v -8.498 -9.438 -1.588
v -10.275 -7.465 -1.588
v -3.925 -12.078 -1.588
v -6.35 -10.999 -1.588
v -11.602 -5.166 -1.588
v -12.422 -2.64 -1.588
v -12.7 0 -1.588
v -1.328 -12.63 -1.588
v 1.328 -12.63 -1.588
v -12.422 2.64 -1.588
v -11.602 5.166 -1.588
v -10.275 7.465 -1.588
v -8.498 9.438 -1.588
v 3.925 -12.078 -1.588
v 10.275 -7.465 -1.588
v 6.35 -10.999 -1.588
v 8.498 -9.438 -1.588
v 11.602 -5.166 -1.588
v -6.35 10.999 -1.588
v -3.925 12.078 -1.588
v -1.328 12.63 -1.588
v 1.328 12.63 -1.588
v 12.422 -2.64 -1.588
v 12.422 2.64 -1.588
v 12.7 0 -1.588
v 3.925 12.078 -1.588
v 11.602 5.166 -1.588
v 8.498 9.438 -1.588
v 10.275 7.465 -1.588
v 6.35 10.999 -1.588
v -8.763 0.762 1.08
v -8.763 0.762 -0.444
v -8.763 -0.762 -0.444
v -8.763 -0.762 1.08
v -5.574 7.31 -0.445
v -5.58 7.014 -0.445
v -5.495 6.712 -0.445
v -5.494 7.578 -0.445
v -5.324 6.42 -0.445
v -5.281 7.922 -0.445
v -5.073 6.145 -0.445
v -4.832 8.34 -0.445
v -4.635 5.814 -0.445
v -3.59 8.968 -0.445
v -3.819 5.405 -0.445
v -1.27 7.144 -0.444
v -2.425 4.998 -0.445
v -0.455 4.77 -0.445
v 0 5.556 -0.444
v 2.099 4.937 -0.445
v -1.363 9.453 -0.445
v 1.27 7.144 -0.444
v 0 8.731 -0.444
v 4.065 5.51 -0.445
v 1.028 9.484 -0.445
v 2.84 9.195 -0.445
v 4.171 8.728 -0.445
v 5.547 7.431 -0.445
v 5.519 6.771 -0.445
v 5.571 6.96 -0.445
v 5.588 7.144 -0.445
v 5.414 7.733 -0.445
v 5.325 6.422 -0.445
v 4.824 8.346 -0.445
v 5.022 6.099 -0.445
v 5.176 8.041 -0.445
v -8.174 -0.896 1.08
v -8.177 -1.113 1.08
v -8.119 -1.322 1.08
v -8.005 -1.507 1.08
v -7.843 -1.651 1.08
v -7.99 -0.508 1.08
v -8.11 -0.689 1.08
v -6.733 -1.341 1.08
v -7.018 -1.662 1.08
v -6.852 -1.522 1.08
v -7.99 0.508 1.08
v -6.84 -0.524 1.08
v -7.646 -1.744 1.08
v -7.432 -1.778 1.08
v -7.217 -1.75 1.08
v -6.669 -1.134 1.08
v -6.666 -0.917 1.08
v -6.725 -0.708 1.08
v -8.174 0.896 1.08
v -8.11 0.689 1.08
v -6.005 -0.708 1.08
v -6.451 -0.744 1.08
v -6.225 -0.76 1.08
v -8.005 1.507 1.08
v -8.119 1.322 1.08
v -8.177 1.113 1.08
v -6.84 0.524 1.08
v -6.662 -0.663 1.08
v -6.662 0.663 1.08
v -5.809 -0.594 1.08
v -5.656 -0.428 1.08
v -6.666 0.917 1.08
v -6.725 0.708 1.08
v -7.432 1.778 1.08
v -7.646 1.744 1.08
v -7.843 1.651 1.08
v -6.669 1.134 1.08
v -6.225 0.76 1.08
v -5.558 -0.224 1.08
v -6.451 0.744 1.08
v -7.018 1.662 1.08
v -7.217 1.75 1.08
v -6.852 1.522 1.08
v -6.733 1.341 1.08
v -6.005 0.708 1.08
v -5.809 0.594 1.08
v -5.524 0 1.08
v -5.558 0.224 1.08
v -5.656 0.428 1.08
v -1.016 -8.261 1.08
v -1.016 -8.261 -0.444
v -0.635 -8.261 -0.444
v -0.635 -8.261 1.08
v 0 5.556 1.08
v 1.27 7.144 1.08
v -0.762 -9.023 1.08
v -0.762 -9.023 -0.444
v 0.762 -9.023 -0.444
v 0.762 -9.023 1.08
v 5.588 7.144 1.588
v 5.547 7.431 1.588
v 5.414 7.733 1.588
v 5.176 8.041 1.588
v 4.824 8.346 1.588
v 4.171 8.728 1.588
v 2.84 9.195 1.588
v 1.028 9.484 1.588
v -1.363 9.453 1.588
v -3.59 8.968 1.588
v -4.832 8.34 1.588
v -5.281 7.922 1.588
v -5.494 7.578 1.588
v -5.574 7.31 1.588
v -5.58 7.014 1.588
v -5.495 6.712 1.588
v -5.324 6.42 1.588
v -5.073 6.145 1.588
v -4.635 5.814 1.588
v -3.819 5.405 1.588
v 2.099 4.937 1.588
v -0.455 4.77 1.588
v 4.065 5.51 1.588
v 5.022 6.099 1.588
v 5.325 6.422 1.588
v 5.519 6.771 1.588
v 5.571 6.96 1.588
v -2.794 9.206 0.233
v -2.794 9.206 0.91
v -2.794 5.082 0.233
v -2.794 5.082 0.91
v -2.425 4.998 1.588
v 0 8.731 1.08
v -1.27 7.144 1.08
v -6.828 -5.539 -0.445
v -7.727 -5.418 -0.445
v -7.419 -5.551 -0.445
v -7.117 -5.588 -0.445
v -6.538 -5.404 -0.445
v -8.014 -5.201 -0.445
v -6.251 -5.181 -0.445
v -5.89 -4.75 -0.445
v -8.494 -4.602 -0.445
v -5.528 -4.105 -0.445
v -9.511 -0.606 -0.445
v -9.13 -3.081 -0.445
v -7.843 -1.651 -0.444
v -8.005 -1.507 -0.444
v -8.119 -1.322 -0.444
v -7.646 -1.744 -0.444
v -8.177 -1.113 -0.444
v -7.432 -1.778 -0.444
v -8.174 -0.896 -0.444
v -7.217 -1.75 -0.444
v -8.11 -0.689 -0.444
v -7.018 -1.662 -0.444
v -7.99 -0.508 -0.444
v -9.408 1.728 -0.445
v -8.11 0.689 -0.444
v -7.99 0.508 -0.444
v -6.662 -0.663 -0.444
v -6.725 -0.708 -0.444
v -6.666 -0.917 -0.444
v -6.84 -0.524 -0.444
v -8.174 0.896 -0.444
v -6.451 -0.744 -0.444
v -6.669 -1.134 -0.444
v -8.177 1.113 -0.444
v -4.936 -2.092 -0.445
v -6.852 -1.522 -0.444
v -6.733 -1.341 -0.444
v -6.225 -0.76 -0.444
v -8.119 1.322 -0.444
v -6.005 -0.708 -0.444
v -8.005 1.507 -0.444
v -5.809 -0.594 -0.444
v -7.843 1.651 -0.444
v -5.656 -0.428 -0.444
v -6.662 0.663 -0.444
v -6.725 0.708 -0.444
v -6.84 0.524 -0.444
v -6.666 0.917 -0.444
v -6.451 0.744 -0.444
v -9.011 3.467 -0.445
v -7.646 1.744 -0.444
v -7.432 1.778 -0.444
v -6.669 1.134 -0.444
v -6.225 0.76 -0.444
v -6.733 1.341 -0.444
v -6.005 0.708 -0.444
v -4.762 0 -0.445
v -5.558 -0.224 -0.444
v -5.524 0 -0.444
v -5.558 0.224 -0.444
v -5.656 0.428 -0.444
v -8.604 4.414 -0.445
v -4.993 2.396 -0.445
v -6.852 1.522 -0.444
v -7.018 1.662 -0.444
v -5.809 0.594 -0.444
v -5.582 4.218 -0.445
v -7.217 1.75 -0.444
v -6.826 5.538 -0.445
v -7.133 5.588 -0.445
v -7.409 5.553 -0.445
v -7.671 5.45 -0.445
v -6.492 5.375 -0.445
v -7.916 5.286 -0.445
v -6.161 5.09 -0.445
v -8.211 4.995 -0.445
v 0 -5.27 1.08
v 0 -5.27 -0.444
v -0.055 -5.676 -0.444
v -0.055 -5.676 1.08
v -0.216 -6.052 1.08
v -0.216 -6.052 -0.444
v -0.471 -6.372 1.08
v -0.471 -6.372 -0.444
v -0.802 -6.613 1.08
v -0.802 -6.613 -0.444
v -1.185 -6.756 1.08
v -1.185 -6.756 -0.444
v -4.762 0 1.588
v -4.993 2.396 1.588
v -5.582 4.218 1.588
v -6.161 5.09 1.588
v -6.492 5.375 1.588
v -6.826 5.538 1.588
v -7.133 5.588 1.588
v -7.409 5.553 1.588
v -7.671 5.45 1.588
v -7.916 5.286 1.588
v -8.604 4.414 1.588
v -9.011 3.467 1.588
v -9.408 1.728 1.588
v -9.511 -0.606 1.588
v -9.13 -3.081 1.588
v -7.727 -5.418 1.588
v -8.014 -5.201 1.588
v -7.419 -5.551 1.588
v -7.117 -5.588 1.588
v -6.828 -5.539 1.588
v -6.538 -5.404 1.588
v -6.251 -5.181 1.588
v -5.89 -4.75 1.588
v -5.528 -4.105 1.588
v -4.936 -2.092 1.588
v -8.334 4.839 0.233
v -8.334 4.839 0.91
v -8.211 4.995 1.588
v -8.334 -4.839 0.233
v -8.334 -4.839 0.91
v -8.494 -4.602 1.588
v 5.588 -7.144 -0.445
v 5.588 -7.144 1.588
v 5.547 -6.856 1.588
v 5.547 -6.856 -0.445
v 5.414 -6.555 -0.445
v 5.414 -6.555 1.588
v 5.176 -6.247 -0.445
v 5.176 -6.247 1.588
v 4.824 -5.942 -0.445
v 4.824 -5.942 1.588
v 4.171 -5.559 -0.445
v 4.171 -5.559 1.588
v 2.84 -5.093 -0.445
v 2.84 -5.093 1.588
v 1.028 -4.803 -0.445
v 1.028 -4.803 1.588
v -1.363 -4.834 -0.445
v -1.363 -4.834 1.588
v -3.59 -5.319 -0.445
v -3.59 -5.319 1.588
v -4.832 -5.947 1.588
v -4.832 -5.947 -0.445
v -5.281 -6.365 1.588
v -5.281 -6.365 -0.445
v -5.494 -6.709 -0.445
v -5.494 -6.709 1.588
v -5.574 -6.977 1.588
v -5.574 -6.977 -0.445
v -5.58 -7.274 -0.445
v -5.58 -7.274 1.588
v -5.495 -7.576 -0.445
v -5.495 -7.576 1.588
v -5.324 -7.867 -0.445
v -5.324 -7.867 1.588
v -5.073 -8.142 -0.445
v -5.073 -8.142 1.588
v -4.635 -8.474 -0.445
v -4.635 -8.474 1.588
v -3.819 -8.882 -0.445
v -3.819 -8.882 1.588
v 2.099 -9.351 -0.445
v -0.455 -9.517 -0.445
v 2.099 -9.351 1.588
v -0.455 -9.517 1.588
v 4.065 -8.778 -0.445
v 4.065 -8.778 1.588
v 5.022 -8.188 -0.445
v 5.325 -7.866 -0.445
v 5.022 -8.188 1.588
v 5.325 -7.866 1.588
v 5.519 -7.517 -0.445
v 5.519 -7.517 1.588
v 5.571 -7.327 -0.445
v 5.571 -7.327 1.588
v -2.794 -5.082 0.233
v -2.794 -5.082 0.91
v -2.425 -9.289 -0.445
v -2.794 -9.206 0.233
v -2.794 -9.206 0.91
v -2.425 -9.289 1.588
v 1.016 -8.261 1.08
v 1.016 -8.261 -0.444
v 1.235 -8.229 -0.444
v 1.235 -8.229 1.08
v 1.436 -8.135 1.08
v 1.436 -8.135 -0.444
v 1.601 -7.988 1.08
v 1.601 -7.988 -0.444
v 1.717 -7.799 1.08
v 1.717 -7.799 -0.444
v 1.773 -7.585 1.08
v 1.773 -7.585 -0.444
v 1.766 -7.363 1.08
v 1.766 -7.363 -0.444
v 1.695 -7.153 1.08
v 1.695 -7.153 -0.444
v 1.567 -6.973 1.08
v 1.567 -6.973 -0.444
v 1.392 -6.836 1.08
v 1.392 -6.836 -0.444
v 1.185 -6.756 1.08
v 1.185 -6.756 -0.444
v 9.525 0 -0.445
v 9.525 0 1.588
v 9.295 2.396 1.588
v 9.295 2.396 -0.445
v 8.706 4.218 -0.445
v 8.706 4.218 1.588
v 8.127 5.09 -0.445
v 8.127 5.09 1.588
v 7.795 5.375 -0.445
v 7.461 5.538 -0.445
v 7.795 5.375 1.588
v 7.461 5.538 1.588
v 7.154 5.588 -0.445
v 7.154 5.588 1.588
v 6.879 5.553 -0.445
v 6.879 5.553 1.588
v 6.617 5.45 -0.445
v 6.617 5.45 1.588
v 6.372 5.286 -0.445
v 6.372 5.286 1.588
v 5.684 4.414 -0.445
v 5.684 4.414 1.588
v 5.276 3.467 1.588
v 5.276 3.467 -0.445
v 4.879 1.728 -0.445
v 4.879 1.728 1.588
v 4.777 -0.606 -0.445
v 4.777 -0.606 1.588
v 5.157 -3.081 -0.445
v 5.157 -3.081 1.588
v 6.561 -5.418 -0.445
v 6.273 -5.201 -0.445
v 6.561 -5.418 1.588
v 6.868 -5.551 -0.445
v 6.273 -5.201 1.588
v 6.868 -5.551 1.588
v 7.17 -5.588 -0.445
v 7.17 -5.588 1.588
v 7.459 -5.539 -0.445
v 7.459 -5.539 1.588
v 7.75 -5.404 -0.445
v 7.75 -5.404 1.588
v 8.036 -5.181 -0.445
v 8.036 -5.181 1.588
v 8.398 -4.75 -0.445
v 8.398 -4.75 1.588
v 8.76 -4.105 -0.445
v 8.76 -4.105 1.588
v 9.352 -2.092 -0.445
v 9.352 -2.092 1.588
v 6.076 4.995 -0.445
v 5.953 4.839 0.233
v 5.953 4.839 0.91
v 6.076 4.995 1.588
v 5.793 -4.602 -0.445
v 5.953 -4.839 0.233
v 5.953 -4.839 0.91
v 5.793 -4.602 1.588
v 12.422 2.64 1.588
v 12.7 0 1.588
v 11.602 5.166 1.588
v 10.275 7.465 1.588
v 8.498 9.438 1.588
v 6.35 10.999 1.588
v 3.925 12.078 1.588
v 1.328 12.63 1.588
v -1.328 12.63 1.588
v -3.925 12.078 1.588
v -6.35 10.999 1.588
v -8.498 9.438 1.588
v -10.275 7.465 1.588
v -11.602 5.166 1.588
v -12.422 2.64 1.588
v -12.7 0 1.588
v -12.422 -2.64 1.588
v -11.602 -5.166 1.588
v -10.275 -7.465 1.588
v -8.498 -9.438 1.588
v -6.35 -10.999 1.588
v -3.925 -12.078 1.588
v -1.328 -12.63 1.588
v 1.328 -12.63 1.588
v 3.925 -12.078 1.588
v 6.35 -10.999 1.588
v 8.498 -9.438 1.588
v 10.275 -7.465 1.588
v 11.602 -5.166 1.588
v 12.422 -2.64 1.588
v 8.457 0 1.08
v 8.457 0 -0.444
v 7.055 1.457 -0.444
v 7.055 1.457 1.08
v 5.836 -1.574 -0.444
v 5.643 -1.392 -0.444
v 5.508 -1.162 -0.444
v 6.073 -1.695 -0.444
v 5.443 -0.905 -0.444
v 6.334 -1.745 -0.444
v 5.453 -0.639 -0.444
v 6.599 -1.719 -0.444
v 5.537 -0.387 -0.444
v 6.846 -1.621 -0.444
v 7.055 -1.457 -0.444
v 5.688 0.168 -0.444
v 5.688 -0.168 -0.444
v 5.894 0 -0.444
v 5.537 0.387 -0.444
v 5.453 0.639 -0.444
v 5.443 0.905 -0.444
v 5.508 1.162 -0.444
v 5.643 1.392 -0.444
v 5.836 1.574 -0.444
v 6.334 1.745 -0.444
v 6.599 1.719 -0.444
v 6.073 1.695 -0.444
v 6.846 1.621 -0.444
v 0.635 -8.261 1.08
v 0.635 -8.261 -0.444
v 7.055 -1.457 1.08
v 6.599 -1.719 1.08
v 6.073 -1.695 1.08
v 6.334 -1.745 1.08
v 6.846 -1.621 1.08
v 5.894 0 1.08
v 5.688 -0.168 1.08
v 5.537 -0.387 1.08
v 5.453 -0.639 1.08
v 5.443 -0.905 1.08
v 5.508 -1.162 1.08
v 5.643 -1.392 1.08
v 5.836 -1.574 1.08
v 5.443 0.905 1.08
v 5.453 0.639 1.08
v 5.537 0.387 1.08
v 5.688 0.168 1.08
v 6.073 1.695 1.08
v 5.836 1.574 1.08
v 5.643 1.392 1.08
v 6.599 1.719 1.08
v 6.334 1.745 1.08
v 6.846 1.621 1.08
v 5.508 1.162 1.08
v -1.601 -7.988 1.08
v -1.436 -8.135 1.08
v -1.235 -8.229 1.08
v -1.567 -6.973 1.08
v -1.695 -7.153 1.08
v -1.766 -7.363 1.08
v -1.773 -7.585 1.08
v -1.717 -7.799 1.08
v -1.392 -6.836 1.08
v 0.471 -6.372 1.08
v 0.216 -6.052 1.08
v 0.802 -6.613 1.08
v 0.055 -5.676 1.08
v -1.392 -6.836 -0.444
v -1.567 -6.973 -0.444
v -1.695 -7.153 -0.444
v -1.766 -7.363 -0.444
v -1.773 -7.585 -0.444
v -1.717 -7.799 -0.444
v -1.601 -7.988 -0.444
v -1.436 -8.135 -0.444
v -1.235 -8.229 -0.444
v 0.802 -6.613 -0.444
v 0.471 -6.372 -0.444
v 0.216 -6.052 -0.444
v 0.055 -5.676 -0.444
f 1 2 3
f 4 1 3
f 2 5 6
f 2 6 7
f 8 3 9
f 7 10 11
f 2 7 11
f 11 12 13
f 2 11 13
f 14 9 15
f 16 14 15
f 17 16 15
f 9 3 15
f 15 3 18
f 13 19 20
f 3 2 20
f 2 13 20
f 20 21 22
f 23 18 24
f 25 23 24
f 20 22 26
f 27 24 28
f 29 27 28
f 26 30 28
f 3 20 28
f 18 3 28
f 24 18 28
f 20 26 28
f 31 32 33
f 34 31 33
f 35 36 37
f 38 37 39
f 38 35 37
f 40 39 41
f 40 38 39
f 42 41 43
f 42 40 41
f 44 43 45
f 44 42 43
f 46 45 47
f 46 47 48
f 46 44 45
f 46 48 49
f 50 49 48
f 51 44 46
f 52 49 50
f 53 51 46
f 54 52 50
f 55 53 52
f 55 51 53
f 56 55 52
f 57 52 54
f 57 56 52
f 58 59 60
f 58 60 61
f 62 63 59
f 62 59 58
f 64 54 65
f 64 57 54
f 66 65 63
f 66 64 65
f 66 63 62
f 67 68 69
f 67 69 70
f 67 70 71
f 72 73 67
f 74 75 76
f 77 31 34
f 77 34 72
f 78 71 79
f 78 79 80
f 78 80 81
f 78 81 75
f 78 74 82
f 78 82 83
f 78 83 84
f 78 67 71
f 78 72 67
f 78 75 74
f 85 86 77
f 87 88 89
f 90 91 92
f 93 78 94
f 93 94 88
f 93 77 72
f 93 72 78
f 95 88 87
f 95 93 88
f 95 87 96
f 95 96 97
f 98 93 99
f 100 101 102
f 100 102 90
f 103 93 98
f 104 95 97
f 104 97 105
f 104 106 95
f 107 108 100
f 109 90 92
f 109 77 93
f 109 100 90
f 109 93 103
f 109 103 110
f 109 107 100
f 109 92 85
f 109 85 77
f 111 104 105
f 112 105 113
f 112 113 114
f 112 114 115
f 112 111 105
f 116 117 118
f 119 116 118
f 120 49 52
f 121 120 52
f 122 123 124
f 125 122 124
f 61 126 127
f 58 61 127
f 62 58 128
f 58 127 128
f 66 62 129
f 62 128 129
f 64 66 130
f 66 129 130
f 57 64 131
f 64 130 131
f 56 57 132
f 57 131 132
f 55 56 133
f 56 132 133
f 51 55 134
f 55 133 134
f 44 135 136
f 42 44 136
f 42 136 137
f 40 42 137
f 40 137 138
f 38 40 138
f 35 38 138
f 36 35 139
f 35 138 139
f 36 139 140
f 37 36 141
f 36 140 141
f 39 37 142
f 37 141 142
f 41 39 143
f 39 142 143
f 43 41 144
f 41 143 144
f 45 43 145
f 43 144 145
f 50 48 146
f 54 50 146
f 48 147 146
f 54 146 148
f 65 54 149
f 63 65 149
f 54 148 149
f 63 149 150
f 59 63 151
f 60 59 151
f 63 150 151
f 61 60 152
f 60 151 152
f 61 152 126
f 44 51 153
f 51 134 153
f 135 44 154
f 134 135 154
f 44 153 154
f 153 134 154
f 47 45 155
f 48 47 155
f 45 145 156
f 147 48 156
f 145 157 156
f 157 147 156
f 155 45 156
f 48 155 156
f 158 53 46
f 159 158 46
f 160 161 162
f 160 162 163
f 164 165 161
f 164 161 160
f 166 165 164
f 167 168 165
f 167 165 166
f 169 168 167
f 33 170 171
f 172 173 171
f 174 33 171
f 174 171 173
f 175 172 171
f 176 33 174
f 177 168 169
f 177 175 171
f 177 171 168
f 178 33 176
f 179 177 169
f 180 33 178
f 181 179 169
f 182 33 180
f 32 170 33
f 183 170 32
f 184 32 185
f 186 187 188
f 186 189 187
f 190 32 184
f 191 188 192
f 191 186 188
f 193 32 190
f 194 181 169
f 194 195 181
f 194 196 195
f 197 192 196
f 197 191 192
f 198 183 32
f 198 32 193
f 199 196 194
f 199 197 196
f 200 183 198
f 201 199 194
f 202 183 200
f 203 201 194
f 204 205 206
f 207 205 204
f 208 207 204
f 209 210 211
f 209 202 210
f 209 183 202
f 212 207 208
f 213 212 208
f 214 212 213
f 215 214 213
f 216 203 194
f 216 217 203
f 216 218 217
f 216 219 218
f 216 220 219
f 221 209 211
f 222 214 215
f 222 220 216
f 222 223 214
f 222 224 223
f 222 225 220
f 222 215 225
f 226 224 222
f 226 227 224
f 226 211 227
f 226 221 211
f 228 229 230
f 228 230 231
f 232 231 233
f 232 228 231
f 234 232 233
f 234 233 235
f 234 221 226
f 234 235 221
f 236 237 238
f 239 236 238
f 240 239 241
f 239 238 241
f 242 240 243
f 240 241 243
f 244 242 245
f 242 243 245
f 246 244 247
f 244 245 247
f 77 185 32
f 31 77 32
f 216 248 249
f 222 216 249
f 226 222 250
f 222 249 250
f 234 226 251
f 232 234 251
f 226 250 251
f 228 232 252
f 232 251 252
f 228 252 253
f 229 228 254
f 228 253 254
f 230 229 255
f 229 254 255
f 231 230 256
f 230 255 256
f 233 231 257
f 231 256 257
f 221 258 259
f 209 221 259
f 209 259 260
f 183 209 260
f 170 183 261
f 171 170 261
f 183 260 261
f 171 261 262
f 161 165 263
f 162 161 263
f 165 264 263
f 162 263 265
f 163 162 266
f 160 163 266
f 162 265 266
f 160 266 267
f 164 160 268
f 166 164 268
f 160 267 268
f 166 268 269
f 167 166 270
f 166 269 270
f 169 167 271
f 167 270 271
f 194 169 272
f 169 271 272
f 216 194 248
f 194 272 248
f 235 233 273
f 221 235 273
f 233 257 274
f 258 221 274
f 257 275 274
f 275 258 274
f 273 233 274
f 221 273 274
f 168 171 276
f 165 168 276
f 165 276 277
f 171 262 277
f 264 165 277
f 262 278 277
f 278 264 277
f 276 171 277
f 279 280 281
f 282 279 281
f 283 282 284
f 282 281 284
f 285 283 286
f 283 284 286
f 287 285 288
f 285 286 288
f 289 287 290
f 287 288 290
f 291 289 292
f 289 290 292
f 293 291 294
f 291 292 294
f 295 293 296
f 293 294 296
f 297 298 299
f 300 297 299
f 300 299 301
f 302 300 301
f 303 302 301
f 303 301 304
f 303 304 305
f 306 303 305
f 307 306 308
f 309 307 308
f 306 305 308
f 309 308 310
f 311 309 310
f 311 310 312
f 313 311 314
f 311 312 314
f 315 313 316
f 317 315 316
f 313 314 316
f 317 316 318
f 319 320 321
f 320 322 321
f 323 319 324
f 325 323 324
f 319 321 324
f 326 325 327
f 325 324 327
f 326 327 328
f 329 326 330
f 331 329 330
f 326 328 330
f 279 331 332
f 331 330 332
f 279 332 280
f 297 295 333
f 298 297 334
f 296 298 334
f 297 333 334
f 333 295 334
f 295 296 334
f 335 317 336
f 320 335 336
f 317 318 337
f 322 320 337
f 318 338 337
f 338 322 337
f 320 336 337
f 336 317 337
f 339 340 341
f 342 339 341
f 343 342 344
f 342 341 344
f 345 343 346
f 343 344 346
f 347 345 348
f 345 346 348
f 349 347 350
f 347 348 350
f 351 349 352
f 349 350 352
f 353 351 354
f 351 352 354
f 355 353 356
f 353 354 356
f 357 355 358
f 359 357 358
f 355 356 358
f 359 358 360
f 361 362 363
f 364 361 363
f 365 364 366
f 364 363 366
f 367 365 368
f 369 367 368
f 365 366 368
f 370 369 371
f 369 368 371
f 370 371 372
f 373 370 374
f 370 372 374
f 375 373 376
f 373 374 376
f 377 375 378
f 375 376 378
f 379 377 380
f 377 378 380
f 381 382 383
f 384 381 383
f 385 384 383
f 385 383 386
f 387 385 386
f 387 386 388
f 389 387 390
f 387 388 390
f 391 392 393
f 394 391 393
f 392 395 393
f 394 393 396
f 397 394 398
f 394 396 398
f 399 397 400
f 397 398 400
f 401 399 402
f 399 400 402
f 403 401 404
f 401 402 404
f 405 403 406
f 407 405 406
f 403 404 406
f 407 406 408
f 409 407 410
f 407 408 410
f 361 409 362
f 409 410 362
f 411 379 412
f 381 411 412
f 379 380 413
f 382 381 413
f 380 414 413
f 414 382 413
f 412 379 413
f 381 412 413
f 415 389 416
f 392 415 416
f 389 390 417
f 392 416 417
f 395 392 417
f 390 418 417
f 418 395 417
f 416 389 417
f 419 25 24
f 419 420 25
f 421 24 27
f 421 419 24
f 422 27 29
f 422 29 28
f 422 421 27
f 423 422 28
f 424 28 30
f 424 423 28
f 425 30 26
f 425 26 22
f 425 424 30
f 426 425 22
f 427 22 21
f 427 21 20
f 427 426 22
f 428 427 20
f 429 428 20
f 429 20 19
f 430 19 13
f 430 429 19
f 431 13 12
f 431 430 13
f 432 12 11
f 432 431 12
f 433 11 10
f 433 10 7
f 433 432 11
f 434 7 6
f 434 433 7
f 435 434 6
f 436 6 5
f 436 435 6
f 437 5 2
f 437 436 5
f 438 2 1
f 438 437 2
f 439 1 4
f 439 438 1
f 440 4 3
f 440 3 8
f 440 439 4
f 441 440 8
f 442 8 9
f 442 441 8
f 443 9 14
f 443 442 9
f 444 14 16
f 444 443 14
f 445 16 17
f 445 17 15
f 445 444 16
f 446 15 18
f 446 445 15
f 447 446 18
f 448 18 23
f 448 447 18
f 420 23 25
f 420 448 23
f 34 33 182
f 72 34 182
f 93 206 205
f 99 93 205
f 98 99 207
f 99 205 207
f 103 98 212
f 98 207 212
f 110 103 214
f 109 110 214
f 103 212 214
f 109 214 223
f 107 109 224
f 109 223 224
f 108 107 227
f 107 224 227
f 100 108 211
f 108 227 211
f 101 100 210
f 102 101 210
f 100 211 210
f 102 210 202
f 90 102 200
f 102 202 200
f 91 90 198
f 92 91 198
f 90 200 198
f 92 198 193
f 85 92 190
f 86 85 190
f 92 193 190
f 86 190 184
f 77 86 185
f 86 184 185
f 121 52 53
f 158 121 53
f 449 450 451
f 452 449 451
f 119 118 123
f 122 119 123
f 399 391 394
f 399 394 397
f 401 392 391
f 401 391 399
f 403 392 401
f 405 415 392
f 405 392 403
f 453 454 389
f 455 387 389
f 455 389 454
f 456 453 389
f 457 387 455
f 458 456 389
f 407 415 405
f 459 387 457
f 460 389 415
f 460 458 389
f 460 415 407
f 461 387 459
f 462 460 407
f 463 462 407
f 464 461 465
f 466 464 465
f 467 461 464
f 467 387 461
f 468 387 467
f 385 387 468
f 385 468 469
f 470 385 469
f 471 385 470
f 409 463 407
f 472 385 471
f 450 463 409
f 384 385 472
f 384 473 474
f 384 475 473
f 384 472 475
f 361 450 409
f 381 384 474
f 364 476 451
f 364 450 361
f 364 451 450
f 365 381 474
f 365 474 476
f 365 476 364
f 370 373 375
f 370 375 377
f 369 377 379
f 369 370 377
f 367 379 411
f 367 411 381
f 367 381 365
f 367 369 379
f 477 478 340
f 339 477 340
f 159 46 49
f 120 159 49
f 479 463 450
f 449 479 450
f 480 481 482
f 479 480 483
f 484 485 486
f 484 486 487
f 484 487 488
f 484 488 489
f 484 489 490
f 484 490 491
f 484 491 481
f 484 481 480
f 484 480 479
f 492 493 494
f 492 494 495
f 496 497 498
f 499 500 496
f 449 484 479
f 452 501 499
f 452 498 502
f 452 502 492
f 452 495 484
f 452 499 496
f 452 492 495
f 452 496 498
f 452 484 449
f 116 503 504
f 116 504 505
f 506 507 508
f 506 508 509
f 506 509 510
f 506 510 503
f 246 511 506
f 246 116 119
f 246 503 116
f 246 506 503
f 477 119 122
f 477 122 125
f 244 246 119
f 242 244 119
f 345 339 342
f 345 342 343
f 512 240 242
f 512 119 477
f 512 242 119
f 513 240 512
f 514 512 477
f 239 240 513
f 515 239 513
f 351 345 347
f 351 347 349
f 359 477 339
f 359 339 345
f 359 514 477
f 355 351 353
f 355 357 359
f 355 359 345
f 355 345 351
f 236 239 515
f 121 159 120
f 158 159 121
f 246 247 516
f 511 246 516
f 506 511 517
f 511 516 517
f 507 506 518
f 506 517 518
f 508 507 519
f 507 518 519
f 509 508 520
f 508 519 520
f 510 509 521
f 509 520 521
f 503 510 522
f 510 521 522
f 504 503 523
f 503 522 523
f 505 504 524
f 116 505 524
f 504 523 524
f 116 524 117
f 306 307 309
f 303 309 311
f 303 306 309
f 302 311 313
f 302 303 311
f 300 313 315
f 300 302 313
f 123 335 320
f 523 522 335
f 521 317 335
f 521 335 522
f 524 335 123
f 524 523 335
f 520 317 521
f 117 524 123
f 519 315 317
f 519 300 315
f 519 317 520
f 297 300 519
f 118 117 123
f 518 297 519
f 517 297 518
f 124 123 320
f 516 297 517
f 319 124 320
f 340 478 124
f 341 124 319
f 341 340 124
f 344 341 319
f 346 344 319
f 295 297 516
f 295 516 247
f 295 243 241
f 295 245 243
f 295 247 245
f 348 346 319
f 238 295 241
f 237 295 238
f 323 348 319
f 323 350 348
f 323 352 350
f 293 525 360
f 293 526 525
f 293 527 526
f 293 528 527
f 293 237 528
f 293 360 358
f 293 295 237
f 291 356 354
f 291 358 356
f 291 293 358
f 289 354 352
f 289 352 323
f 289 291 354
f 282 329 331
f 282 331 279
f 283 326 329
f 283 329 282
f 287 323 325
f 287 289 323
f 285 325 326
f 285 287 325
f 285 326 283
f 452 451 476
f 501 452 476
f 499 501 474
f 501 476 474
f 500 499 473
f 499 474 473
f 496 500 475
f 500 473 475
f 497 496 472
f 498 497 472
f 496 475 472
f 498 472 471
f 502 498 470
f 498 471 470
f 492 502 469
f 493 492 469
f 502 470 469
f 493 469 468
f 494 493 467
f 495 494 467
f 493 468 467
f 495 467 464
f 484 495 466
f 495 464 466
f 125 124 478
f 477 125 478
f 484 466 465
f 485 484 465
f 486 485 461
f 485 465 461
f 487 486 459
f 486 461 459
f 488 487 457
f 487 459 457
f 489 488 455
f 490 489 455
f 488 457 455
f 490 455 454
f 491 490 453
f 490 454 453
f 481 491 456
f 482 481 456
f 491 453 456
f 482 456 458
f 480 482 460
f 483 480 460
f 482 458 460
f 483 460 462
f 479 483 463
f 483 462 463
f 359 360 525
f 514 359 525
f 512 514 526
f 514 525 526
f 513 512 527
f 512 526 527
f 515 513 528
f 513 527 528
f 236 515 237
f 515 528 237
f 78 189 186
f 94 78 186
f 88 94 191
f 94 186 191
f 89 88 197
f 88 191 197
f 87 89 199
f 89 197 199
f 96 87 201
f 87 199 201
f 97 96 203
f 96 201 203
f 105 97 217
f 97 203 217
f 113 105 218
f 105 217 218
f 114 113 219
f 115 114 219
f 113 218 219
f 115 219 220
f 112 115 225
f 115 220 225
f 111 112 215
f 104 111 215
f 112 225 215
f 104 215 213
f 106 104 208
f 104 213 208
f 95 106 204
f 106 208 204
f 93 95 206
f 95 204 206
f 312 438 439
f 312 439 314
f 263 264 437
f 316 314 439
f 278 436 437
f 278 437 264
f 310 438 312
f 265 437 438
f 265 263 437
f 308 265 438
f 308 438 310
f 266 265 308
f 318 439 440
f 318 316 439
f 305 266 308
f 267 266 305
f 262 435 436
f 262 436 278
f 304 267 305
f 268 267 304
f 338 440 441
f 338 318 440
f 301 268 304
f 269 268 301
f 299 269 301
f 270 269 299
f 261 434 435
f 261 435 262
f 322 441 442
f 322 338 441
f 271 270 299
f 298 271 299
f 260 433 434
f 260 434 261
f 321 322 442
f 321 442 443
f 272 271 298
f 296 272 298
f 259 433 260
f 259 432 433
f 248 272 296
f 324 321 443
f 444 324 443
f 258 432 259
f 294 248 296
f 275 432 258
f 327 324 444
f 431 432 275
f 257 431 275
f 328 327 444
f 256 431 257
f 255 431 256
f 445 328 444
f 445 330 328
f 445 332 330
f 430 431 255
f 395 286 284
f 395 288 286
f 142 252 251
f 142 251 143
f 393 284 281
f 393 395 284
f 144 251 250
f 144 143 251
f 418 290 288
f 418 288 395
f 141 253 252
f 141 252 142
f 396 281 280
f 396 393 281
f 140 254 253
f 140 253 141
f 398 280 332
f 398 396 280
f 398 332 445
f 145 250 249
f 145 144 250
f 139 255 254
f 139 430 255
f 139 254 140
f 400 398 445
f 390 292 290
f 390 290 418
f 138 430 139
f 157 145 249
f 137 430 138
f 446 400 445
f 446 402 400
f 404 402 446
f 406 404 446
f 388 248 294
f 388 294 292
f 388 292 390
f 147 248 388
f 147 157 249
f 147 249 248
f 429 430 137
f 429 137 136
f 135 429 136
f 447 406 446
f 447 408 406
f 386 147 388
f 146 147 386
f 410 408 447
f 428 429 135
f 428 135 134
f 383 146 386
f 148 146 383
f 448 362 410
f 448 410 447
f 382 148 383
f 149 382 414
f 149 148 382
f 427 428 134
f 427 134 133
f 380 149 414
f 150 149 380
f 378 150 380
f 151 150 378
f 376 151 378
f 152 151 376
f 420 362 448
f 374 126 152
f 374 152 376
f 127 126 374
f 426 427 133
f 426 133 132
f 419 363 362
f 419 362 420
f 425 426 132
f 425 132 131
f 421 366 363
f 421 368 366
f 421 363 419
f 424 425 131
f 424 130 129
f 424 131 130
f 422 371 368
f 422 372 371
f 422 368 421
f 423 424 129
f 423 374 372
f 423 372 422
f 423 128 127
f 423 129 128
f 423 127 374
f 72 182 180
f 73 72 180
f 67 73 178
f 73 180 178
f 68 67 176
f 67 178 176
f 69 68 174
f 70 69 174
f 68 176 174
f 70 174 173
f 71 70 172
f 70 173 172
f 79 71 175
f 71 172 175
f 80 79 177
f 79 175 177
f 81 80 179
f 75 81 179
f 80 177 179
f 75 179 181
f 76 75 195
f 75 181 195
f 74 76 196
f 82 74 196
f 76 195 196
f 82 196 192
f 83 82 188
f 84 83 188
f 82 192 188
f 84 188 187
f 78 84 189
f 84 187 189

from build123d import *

# Parameters (mm, degrees)
F0_R     = 12.7
F1_DEPTH = 1.5875
F3_DEPTH = 2.032
F5_DEPTH = 1.524


with BuildPart() as f1:
    # F0 (on Top) → F1 (new body, symmetric)
    with BuildSketch(Plane.XY):
        Circle(F0_R)
    extrude(amount=F1_DEPTH, both=True)

    # F2 (on face) → F3 (cut)
    with BuildSketch(Plane.XY.offset(1.5875)):
        with BuildLine():
            add(Edge.make_bspline(
                [(5.588, 7.14375), (5.588, 11.268196), (-2.794, 9.205973), (-11.176, 7.14375), (-2.794, 5.081527), (5.588, 3.019304), (5.588, 7.14375)],
                knots=[0, 0, 0, 2.094395, 2.094395, 4.18879, 4.18879, 6.283185, 6.283185, 6.283185], degree=2, weights=[1, 0.5, 1, 0.5, 1, 0.5, 1]))
        make_face()
        with BuildLine():
            add(Edge.make_bspline(
                [(9.525, 0), (9.525, 9.6787), (5.953125, 4.83935), (2.38125, 0), (5.953125, -4.83935), (9.525, -9.6787), (9.525, 0)],
                knots=[4.712389, 4.712389, 4.712389, 6.806784, 6.806784, 8.901179, 8.901179, 10.995574, 10.995574, 10.995574], degree=2, weights=[1, 0.5, 1, 0.5, 1, 0.5, 1]))
        make_face()
        with BuildLine():
            add(Edge.make_bspline(
                [(5.588, -7.14375), (5.588, -3.019304), (-2.794, -5.081527), (-11.176, -7.14375), (-2.794, -9.205973), (5.588, -11.268196), (5.588, -7.14375)],
                knots=[0, 0, 0, 2.094395, 2.094395, 4.18879, 4.18879, 6.283185, 6.283185, 6.283185], degree=2, weights=[1, 0.5, 1, 0.5, 1, 0.5, 1]))
        make_face()
        with BuildLine():
            add(Edge.make_bspline(
                [(-4.7625, 0), (-4.7625, 9.6787), (-8.334375, 4.83935), (-11.90625, 0), (-8.334375, -4.83935), (-4.7625, -9.6787), (-4.7625, 0)],
                knots=[4.712389, 4.712389, 4.712389, 6.806784, 6.806784, 8.901179, 8.901179, 10.995574, 10.995574, 10.995574], degree=2, weights=[1, 0.5, 1, 0.5, 1, 0.5, 1]))
        make_face()
    extrude(amount=-F3_DEPTH, mode=Mode.SUBTRACT)

    # F4 (on face) → F5 (join)
    with BuildSketch(Plane.XY.offset(-0.4445)):
        Polygon((-1.27, 7.14375), (0, 5.55625), (1.27, 7.14375), (0, 8.73125), align=None)
        with BuildLine():
            ThreePointArc((7.055314, 1.457363), (5.642827, 1.391566), (5.893814, 0))
            ThreePointArc((5.893814, 0), (5.642827, -1.391566), (7.055314, -1.457363))
            Line((7.055314, -1.457363), (8.457202, 0))
            Line((8.457202, 0), (7.055314, 1.457363))
        make_face()
        with BuildLine():
            ThreePointArc((1.185333, -6.756394), (0.332634, -6.220881), (0, -5.2705))
            ThreePointArc((0, -5.2705), (-0.332634, -6.220881), (-1.185333, -6.756394))
            ThreePointArc((-1.185333, -6.756394), (-1.773222, -7.584542), (-1.016, -8.261341))
            Line((-1.016, -8.261341), (-0.635, -8.261341))
            Line((-0.635, -8.261341), (0.635, -8.261341))
            Line((0.635, -8.261341), (1.016, -8.261341))
            ThreePointArc((1.016, -8.261341), (1.773222, -7.584542), (1.185333, -6.756394))
        make_face()
        Polygon((0.762, -9.023341), (0.635, -8.261341), (-0.635, -8.261341), (-0.762, -9.023341), align=None)
        with BuildLine():
            ThreePointArc((-7.989597, -0.508), (-7.432072, -1.777929), (-6.839975, -0.523746))
            ThreePointArc((-6.839975, -0.523746), (-5.5245, 0), (-6.839975, 0.523746))
            ThreePointArc((-6.839975, 0.523746), (-7.432072, 1.777929), (-7.989597, 0.508))
            Line((-7.989597, 0.508), (-8.763, 0.762))
            Line((-8.763, 0.762), (-8.763, -0.762))
            Line((-8.763, -0.762), (-7.989597, -0.508))
        make_face()
    extrude(amount=F5_DEPTH)


solid = f1.part
